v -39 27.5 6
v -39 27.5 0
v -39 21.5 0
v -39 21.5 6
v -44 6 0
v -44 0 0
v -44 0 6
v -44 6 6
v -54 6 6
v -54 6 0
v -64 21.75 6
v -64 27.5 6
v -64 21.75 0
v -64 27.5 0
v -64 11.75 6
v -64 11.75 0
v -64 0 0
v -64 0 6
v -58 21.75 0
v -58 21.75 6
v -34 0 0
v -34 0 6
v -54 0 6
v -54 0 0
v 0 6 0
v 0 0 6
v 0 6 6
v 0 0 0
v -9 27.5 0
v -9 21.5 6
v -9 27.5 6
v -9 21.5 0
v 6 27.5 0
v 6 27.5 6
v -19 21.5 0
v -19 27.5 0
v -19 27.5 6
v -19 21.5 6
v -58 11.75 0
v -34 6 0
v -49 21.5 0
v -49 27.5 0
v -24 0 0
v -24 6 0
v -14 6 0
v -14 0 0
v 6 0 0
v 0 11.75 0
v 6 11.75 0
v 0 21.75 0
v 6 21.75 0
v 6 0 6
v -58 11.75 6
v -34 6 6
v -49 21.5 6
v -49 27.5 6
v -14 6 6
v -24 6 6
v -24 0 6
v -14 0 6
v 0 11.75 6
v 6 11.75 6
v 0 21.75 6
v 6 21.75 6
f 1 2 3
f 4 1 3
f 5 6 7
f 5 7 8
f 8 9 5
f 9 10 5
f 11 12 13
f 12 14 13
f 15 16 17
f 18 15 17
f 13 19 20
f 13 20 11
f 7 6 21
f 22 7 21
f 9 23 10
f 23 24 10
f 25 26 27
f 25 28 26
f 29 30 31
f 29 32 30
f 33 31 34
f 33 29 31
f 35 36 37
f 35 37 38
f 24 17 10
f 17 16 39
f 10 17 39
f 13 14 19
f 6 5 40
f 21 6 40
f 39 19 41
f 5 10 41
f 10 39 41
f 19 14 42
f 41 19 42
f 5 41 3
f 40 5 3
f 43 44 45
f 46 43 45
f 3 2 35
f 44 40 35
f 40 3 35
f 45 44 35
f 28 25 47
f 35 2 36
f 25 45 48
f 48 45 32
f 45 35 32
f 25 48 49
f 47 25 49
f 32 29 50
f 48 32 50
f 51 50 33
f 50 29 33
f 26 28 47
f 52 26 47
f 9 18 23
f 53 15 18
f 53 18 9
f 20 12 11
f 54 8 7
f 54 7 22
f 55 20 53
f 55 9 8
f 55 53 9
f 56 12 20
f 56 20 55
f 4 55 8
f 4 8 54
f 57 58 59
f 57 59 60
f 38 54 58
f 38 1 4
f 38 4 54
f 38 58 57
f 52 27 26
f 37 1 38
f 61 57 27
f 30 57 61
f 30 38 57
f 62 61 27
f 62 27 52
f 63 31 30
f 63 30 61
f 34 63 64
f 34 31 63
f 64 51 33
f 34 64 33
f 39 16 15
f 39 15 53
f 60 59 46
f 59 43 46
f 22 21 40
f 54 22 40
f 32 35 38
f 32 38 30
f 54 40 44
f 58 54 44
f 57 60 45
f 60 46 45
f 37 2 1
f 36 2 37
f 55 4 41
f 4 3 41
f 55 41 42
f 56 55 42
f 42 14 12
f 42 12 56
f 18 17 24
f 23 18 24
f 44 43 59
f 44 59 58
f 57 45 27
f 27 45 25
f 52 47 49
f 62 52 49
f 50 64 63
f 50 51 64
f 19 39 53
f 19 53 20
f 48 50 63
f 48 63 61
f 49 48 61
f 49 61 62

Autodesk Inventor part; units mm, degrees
ref_plane "YZ Plane" through (0, 0, 0) normal (1, 0, 0) x (0, 1, 0)
ref_plane "XZ Plane" through (0, 0, 0) normal (0, 1, 0) x (-1, 0, 0)
ref_plane "XY Plane" through (0, 0, 0) normal (0, 0, 1) x (1, 0, 0)
ref_plane "Work Plane1" through (-10.7838, -0.756, 0) normal (0, 0, 1) x (1, 0, 0)
sketch "Sketch1" plane through (-10.7838, -0.756, 0) normal (0, 0, 1) x (1, 0, 0)
  line L0 (-33.2162, 0.756) -> (-33.2162, 6.756)
  line L1 (-33.2162, 0.756) -> (-23.2162, 0.756)
  line L2 (-23.2162, 0.756) -> (-23.2162, 6.756)
  line L3 (-23.2162, 6.756) -> (-33.2162, 6.756)
  line L4 (-3.2162, 0.756) -> (-3.2162, 6.756)
  line L5 (-3.2162, 6.756) -> (-13.2162, 6.756)
  line L6 (-13.2162, 0.756) -> (-13.2162, 6.756)
  line L7 (-13.2162, 0.756) -> (-3.2162, 0.756)
  line L8 (-135.7005, 28.256) -> (83.2995, 28.256)
  line L9 (83.2995, 43.256) -> (-135.7005, 43.256)
  line L10 (-43.2162, 0.756) -> (-43.2162, 6.756)
  line L11 (-43.2162, 6.756) -> (-47.2162, 6.756)
  line L12 (-47.2162, 0.756) -> (-47.2162, 6.756)
  line L13 (-47.2162, 0.756) -> (-43.2162, 0.756)
  line L14 (16.7838, 6.756) -> (10.7838, 6.756)
  line L15 (10.7838, 0.756) -> (10.7838, 6.756)
  line L16 (10.7838, 0.756) -> (16.7838, 0.756)
  line L17 (16.7838, 0.756) -> (16.7838, 6.756)
  line L18 (-53.2162, 6.756) -> (-53.2162, 0.756)
  line L19 (-47.2162, 0.756) -> (-53.2162, 0.756)
  line L20 (-47.2162, 0.756) -> (-47.2162, 6.756)
  line L21 (-47.2162, 6.756) -> (-53.2162, 6.756)
  line L22 (-53.2162, 6.756) -> (16.7838, 6.756)
  line L23 (16.7838, 6.756) -> (16.7838, 28.256)
  line L24 (16.7838, 28.256) -> (-53.2162, 28.256)
  line L25 (-53.2162, 28.256) -> (-53.2162, 6.756)
  line L26 (-53.2162, 12.506) -> (-47.2162, 12.506)
  line L27 (-47.2162, 12.506) -> (-47.2162, 22.506)
  line L28 (-47.2162, 22.506) -> (-53.2162, 22.506)
  line L29 (-53.2162, 22.506) -> (-53.2162, 12.506)
  line L30 (16.7838, 22.506) -> (10.7838, 22.506)
  line L31 (10.7838, 22.506) -> (10.7838, 12.506)
  line L32 (10.7838, 12.506) -> (16.7838, 12.506)
  line L33 (16.7838, 12.506) -> (16.7838, 22.506)
  line L34 (-38.2162, 28.256) -> (-28.2162, 28.256)
  line L35 (-28.2162, 28.256) -> (-28.2162, 22.256)
  line L36 (-28.2162, 22.256) -> (-38.2162, 22.256)
  line L37 (-38.2162, 22.256) -> (-38.2162, 28.256)
  line L38 (1.7838, 28.256) -> (-8.2162, 28.256)
  line L39 (-8.2162, 28.256) -> (-8.2162, 22.256)
  line L40 (-8.2162, 22.256) -> (1.7838, 22.256)
  line L41 (1.7838, 22.256) -> (1.7838, 28.256)
  point P0 (-47.2162, 17.506)
  point P1 (-53.2162, 17.506)
  point P2 (10.7838, 17.506)
  point P3 (16.7838, 17.506)
extrude "Plate1" add sketch "Sketch1" along normal blind 6 contours L0 L3 L2 L1 | L22 L11 L21 L25 L26 L27 L28 L8 L37 L36 L35 L39 L40 L41 L23 L30 L31 L32 L14 L5 L3 | L10 L13 L12 L11 | L5 L4 L7 L6 | L12 L19 L18 L21 | L14 L17 L16 L15
equation "\"d10\" = Thickness"
equation "\"BendRadius\" = Thickness"
equation "\"BendReliefWidth\" = Thickness"
equation "\"BendReliefDepth\" = 0.5 * Thickness"
equation "\"CornerReliefSize\" = 4 * Thickness"
equation "\"MinimumRemnant\" = 2 * Thickness"
equation "\"TransitionRadius\" = BendRadius"
equation "\"JacobiRadiusSize\" = BendRadius"
equation "\"GapSize\" = Thickness"
equation "\"d9\" = d8"
equation "\"Thickness\" = 6"
equation "\"d8\" = 15"
properties part number "onderzijde joystickdoosje" material "Wood (Birch)"
